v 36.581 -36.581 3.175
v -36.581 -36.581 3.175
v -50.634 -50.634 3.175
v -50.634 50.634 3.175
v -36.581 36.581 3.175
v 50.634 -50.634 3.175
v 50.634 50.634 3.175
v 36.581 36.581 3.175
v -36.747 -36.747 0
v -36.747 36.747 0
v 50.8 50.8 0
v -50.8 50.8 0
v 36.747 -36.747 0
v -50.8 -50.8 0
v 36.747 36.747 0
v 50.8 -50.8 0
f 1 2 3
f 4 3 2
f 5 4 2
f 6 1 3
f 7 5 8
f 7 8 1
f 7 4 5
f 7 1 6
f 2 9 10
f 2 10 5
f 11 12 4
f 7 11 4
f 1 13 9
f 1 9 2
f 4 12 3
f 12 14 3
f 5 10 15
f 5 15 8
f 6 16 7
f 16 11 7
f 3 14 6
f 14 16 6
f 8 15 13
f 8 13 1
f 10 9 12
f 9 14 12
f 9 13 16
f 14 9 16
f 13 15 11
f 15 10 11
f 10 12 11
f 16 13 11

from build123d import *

# Parameters (mm, degrees)
F0_W     = 101.6
F0_H     = 101.6
F1_DEPTH = 3.175
F1_TAPER = 3
F2_T     = -14.0335


# Not quite as in the source:
# - a feature of the source that left no trace in its solid (it failed there, or was rolled back) is left out


with BuildPart() as f1:
    # F0 (on Top) → F1 (new body)
    with BuildSketch(Plane.XY):
        Rectangle(F0_W, F0_H)
    extrude(amount=F1_DEPTH, taper=F1_TAPER)

    # F2
    f2_openings = [f1.faces().sort_by_distance(p)[0] for p in [
        (0, 0, 3.175),
        (0, 0, 0),
    ]]
    offset(amount=F2_T, openings=f2_openings)


solid = f1.part
